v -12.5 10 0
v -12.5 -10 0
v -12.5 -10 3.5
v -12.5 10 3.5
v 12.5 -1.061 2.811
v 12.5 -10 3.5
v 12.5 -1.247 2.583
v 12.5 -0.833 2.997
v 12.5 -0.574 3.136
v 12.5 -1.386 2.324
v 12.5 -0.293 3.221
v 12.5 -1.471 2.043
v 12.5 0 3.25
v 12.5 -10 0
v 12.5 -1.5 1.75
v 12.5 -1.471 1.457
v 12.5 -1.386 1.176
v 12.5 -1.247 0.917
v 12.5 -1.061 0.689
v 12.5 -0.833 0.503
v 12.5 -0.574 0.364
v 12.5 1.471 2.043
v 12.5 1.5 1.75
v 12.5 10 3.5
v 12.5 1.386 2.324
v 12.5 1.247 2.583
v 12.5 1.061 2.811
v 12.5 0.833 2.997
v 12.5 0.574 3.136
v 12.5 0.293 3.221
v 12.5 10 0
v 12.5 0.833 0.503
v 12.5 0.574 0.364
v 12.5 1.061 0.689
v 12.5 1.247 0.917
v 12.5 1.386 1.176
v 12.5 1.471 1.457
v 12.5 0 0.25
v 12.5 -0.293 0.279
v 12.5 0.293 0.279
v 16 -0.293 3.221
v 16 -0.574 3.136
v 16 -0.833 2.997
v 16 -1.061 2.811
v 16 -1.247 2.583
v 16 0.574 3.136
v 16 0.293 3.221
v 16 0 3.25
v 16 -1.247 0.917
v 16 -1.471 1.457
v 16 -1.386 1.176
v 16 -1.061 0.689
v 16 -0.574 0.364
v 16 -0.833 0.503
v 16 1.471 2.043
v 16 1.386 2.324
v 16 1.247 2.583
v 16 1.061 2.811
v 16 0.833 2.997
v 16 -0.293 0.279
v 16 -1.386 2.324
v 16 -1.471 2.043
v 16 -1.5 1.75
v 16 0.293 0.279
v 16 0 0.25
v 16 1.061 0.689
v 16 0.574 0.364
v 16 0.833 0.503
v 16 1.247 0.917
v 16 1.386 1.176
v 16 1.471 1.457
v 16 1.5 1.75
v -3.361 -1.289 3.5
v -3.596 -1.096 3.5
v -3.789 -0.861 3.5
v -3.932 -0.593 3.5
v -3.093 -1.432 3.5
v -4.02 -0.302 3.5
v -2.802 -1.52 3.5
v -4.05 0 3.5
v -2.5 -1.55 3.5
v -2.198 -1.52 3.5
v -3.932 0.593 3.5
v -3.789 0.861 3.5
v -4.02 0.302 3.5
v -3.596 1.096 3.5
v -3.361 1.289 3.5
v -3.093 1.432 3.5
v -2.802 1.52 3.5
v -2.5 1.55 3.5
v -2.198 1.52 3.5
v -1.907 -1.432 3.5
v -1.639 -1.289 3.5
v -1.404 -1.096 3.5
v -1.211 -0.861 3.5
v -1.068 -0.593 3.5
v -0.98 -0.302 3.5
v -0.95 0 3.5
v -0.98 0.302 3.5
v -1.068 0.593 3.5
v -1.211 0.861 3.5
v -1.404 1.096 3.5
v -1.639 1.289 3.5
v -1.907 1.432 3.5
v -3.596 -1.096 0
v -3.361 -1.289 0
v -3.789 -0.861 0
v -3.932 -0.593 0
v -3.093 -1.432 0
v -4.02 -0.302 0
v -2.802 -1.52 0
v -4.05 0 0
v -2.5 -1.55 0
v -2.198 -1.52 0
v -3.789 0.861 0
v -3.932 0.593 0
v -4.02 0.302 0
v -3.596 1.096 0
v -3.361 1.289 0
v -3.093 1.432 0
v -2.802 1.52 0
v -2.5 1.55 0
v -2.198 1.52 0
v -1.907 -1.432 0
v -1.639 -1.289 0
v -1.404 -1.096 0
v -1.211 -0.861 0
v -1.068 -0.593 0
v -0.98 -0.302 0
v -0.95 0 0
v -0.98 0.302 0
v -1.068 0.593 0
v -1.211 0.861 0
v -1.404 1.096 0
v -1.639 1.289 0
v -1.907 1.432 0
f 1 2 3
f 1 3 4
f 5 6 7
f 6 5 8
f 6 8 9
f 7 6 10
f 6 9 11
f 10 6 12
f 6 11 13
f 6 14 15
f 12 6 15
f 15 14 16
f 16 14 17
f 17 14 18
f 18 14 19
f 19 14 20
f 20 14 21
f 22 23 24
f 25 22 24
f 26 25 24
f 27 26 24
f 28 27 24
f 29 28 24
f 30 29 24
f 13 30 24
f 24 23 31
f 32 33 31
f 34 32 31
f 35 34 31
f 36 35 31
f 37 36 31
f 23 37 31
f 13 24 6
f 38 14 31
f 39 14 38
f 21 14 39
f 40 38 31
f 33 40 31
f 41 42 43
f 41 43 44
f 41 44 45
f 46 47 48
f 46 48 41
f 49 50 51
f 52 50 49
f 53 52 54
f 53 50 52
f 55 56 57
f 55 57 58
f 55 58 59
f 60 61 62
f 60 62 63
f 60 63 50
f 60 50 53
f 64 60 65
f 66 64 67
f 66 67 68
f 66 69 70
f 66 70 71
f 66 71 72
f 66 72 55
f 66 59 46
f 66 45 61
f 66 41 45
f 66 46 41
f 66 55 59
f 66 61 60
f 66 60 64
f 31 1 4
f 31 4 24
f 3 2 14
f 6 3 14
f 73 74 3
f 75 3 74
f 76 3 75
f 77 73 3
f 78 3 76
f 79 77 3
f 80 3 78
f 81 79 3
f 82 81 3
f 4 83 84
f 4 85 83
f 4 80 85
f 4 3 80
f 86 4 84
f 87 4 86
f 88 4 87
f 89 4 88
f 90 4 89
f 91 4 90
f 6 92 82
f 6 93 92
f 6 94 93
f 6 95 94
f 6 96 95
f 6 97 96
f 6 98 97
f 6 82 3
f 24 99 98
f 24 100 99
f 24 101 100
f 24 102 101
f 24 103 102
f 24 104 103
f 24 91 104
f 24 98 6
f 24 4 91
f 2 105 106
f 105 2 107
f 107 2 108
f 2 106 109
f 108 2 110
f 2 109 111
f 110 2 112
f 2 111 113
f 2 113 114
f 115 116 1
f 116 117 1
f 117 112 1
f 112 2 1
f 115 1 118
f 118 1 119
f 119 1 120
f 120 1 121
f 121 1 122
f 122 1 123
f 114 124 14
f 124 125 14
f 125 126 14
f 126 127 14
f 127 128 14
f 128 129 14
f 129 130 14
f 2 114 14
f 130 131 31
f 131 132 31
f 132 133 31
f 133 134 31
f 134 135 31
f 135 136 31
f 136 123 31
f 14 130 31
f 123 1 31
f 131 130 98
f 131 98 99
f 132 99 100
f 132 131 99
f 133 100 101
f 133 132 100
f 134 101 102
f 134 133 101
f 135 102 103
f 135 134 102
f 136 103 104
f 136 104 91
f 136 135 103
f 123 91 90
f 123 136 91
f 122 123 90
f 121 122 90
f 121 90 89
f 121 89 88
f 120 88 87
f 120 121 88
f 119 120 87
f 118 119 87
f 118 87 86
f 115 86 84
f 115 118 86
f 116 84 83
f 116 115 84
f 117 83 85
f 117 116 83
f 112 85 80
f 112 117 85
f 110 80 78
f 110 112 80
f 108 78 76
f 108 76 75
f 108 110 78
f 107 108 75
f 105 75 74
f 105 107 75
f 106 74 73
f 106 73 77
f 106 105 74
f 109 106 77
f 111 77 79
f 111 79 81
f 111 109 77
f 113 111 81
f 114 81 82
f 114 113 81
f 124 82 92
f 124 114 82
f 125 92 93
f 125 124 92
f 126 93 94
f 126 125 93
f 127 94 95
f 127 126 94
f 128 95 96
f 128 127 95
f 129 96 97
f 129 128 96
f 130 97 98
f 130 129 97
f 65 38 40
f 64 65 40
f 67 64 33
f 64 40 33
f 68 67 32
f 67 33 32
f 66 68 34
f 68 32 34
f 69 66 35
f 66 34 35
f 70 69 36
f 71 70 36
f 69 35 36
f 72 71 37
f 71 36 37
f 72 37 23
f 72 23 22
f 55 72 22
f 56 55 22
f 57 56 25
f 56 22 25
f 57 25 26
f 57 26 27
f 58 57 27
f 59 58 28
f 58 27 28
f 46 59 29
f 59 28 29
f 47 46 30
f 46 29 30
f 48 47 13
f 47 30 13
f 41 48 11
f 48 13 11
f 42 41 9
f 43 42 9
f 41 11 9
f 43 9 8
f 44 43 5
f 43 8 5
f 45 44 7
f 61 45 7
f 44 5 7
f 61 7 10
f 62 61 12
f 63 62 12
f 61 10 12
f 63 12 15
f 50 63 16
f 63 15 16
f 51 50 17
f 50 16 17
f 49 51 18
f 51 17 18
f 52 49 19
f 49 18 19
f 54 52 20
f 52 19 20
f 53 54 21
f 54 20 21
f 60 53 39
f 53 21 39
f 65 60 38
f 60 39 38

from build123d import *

# Parameters (mm, degrees)
SKETCH_1_W      = 25
SKETCH_1_H      = 20
SKETCH_1_R      = 1.55
EXTRUDE_1_DEPTH = 3.5
SKETCH_2_R      = 1.5
EXTRUDE_2_DEPTH = 3.5


with BuildPart() as part:
    # 草图1 → 凸台-拉伸1 (new body)
    with BuildSketch(Plane.XY):
        Rectangle(SKETCH_1_W, SKETCH_1_H)
        with Locations((-2.5, 0)):
            Circle(SKETCH_1_R, mode=Mode.SUBTRACT)
    extrude(amount=EXTRUDE_1_DEPTH)

    # 草图2 → 凸台-拉伸2 (add)
    with BuildSketch(Plane(origin=(12.5, 0, 0), x_dir=(0, 0, -1), z_dir=(1, 0, 0))):
        with Locations((-1.75, 0)):
            Circle(SKETCH_2_R)
    extrude(amount=EXTRUDE_2_DEPTH)


solid = part.part
